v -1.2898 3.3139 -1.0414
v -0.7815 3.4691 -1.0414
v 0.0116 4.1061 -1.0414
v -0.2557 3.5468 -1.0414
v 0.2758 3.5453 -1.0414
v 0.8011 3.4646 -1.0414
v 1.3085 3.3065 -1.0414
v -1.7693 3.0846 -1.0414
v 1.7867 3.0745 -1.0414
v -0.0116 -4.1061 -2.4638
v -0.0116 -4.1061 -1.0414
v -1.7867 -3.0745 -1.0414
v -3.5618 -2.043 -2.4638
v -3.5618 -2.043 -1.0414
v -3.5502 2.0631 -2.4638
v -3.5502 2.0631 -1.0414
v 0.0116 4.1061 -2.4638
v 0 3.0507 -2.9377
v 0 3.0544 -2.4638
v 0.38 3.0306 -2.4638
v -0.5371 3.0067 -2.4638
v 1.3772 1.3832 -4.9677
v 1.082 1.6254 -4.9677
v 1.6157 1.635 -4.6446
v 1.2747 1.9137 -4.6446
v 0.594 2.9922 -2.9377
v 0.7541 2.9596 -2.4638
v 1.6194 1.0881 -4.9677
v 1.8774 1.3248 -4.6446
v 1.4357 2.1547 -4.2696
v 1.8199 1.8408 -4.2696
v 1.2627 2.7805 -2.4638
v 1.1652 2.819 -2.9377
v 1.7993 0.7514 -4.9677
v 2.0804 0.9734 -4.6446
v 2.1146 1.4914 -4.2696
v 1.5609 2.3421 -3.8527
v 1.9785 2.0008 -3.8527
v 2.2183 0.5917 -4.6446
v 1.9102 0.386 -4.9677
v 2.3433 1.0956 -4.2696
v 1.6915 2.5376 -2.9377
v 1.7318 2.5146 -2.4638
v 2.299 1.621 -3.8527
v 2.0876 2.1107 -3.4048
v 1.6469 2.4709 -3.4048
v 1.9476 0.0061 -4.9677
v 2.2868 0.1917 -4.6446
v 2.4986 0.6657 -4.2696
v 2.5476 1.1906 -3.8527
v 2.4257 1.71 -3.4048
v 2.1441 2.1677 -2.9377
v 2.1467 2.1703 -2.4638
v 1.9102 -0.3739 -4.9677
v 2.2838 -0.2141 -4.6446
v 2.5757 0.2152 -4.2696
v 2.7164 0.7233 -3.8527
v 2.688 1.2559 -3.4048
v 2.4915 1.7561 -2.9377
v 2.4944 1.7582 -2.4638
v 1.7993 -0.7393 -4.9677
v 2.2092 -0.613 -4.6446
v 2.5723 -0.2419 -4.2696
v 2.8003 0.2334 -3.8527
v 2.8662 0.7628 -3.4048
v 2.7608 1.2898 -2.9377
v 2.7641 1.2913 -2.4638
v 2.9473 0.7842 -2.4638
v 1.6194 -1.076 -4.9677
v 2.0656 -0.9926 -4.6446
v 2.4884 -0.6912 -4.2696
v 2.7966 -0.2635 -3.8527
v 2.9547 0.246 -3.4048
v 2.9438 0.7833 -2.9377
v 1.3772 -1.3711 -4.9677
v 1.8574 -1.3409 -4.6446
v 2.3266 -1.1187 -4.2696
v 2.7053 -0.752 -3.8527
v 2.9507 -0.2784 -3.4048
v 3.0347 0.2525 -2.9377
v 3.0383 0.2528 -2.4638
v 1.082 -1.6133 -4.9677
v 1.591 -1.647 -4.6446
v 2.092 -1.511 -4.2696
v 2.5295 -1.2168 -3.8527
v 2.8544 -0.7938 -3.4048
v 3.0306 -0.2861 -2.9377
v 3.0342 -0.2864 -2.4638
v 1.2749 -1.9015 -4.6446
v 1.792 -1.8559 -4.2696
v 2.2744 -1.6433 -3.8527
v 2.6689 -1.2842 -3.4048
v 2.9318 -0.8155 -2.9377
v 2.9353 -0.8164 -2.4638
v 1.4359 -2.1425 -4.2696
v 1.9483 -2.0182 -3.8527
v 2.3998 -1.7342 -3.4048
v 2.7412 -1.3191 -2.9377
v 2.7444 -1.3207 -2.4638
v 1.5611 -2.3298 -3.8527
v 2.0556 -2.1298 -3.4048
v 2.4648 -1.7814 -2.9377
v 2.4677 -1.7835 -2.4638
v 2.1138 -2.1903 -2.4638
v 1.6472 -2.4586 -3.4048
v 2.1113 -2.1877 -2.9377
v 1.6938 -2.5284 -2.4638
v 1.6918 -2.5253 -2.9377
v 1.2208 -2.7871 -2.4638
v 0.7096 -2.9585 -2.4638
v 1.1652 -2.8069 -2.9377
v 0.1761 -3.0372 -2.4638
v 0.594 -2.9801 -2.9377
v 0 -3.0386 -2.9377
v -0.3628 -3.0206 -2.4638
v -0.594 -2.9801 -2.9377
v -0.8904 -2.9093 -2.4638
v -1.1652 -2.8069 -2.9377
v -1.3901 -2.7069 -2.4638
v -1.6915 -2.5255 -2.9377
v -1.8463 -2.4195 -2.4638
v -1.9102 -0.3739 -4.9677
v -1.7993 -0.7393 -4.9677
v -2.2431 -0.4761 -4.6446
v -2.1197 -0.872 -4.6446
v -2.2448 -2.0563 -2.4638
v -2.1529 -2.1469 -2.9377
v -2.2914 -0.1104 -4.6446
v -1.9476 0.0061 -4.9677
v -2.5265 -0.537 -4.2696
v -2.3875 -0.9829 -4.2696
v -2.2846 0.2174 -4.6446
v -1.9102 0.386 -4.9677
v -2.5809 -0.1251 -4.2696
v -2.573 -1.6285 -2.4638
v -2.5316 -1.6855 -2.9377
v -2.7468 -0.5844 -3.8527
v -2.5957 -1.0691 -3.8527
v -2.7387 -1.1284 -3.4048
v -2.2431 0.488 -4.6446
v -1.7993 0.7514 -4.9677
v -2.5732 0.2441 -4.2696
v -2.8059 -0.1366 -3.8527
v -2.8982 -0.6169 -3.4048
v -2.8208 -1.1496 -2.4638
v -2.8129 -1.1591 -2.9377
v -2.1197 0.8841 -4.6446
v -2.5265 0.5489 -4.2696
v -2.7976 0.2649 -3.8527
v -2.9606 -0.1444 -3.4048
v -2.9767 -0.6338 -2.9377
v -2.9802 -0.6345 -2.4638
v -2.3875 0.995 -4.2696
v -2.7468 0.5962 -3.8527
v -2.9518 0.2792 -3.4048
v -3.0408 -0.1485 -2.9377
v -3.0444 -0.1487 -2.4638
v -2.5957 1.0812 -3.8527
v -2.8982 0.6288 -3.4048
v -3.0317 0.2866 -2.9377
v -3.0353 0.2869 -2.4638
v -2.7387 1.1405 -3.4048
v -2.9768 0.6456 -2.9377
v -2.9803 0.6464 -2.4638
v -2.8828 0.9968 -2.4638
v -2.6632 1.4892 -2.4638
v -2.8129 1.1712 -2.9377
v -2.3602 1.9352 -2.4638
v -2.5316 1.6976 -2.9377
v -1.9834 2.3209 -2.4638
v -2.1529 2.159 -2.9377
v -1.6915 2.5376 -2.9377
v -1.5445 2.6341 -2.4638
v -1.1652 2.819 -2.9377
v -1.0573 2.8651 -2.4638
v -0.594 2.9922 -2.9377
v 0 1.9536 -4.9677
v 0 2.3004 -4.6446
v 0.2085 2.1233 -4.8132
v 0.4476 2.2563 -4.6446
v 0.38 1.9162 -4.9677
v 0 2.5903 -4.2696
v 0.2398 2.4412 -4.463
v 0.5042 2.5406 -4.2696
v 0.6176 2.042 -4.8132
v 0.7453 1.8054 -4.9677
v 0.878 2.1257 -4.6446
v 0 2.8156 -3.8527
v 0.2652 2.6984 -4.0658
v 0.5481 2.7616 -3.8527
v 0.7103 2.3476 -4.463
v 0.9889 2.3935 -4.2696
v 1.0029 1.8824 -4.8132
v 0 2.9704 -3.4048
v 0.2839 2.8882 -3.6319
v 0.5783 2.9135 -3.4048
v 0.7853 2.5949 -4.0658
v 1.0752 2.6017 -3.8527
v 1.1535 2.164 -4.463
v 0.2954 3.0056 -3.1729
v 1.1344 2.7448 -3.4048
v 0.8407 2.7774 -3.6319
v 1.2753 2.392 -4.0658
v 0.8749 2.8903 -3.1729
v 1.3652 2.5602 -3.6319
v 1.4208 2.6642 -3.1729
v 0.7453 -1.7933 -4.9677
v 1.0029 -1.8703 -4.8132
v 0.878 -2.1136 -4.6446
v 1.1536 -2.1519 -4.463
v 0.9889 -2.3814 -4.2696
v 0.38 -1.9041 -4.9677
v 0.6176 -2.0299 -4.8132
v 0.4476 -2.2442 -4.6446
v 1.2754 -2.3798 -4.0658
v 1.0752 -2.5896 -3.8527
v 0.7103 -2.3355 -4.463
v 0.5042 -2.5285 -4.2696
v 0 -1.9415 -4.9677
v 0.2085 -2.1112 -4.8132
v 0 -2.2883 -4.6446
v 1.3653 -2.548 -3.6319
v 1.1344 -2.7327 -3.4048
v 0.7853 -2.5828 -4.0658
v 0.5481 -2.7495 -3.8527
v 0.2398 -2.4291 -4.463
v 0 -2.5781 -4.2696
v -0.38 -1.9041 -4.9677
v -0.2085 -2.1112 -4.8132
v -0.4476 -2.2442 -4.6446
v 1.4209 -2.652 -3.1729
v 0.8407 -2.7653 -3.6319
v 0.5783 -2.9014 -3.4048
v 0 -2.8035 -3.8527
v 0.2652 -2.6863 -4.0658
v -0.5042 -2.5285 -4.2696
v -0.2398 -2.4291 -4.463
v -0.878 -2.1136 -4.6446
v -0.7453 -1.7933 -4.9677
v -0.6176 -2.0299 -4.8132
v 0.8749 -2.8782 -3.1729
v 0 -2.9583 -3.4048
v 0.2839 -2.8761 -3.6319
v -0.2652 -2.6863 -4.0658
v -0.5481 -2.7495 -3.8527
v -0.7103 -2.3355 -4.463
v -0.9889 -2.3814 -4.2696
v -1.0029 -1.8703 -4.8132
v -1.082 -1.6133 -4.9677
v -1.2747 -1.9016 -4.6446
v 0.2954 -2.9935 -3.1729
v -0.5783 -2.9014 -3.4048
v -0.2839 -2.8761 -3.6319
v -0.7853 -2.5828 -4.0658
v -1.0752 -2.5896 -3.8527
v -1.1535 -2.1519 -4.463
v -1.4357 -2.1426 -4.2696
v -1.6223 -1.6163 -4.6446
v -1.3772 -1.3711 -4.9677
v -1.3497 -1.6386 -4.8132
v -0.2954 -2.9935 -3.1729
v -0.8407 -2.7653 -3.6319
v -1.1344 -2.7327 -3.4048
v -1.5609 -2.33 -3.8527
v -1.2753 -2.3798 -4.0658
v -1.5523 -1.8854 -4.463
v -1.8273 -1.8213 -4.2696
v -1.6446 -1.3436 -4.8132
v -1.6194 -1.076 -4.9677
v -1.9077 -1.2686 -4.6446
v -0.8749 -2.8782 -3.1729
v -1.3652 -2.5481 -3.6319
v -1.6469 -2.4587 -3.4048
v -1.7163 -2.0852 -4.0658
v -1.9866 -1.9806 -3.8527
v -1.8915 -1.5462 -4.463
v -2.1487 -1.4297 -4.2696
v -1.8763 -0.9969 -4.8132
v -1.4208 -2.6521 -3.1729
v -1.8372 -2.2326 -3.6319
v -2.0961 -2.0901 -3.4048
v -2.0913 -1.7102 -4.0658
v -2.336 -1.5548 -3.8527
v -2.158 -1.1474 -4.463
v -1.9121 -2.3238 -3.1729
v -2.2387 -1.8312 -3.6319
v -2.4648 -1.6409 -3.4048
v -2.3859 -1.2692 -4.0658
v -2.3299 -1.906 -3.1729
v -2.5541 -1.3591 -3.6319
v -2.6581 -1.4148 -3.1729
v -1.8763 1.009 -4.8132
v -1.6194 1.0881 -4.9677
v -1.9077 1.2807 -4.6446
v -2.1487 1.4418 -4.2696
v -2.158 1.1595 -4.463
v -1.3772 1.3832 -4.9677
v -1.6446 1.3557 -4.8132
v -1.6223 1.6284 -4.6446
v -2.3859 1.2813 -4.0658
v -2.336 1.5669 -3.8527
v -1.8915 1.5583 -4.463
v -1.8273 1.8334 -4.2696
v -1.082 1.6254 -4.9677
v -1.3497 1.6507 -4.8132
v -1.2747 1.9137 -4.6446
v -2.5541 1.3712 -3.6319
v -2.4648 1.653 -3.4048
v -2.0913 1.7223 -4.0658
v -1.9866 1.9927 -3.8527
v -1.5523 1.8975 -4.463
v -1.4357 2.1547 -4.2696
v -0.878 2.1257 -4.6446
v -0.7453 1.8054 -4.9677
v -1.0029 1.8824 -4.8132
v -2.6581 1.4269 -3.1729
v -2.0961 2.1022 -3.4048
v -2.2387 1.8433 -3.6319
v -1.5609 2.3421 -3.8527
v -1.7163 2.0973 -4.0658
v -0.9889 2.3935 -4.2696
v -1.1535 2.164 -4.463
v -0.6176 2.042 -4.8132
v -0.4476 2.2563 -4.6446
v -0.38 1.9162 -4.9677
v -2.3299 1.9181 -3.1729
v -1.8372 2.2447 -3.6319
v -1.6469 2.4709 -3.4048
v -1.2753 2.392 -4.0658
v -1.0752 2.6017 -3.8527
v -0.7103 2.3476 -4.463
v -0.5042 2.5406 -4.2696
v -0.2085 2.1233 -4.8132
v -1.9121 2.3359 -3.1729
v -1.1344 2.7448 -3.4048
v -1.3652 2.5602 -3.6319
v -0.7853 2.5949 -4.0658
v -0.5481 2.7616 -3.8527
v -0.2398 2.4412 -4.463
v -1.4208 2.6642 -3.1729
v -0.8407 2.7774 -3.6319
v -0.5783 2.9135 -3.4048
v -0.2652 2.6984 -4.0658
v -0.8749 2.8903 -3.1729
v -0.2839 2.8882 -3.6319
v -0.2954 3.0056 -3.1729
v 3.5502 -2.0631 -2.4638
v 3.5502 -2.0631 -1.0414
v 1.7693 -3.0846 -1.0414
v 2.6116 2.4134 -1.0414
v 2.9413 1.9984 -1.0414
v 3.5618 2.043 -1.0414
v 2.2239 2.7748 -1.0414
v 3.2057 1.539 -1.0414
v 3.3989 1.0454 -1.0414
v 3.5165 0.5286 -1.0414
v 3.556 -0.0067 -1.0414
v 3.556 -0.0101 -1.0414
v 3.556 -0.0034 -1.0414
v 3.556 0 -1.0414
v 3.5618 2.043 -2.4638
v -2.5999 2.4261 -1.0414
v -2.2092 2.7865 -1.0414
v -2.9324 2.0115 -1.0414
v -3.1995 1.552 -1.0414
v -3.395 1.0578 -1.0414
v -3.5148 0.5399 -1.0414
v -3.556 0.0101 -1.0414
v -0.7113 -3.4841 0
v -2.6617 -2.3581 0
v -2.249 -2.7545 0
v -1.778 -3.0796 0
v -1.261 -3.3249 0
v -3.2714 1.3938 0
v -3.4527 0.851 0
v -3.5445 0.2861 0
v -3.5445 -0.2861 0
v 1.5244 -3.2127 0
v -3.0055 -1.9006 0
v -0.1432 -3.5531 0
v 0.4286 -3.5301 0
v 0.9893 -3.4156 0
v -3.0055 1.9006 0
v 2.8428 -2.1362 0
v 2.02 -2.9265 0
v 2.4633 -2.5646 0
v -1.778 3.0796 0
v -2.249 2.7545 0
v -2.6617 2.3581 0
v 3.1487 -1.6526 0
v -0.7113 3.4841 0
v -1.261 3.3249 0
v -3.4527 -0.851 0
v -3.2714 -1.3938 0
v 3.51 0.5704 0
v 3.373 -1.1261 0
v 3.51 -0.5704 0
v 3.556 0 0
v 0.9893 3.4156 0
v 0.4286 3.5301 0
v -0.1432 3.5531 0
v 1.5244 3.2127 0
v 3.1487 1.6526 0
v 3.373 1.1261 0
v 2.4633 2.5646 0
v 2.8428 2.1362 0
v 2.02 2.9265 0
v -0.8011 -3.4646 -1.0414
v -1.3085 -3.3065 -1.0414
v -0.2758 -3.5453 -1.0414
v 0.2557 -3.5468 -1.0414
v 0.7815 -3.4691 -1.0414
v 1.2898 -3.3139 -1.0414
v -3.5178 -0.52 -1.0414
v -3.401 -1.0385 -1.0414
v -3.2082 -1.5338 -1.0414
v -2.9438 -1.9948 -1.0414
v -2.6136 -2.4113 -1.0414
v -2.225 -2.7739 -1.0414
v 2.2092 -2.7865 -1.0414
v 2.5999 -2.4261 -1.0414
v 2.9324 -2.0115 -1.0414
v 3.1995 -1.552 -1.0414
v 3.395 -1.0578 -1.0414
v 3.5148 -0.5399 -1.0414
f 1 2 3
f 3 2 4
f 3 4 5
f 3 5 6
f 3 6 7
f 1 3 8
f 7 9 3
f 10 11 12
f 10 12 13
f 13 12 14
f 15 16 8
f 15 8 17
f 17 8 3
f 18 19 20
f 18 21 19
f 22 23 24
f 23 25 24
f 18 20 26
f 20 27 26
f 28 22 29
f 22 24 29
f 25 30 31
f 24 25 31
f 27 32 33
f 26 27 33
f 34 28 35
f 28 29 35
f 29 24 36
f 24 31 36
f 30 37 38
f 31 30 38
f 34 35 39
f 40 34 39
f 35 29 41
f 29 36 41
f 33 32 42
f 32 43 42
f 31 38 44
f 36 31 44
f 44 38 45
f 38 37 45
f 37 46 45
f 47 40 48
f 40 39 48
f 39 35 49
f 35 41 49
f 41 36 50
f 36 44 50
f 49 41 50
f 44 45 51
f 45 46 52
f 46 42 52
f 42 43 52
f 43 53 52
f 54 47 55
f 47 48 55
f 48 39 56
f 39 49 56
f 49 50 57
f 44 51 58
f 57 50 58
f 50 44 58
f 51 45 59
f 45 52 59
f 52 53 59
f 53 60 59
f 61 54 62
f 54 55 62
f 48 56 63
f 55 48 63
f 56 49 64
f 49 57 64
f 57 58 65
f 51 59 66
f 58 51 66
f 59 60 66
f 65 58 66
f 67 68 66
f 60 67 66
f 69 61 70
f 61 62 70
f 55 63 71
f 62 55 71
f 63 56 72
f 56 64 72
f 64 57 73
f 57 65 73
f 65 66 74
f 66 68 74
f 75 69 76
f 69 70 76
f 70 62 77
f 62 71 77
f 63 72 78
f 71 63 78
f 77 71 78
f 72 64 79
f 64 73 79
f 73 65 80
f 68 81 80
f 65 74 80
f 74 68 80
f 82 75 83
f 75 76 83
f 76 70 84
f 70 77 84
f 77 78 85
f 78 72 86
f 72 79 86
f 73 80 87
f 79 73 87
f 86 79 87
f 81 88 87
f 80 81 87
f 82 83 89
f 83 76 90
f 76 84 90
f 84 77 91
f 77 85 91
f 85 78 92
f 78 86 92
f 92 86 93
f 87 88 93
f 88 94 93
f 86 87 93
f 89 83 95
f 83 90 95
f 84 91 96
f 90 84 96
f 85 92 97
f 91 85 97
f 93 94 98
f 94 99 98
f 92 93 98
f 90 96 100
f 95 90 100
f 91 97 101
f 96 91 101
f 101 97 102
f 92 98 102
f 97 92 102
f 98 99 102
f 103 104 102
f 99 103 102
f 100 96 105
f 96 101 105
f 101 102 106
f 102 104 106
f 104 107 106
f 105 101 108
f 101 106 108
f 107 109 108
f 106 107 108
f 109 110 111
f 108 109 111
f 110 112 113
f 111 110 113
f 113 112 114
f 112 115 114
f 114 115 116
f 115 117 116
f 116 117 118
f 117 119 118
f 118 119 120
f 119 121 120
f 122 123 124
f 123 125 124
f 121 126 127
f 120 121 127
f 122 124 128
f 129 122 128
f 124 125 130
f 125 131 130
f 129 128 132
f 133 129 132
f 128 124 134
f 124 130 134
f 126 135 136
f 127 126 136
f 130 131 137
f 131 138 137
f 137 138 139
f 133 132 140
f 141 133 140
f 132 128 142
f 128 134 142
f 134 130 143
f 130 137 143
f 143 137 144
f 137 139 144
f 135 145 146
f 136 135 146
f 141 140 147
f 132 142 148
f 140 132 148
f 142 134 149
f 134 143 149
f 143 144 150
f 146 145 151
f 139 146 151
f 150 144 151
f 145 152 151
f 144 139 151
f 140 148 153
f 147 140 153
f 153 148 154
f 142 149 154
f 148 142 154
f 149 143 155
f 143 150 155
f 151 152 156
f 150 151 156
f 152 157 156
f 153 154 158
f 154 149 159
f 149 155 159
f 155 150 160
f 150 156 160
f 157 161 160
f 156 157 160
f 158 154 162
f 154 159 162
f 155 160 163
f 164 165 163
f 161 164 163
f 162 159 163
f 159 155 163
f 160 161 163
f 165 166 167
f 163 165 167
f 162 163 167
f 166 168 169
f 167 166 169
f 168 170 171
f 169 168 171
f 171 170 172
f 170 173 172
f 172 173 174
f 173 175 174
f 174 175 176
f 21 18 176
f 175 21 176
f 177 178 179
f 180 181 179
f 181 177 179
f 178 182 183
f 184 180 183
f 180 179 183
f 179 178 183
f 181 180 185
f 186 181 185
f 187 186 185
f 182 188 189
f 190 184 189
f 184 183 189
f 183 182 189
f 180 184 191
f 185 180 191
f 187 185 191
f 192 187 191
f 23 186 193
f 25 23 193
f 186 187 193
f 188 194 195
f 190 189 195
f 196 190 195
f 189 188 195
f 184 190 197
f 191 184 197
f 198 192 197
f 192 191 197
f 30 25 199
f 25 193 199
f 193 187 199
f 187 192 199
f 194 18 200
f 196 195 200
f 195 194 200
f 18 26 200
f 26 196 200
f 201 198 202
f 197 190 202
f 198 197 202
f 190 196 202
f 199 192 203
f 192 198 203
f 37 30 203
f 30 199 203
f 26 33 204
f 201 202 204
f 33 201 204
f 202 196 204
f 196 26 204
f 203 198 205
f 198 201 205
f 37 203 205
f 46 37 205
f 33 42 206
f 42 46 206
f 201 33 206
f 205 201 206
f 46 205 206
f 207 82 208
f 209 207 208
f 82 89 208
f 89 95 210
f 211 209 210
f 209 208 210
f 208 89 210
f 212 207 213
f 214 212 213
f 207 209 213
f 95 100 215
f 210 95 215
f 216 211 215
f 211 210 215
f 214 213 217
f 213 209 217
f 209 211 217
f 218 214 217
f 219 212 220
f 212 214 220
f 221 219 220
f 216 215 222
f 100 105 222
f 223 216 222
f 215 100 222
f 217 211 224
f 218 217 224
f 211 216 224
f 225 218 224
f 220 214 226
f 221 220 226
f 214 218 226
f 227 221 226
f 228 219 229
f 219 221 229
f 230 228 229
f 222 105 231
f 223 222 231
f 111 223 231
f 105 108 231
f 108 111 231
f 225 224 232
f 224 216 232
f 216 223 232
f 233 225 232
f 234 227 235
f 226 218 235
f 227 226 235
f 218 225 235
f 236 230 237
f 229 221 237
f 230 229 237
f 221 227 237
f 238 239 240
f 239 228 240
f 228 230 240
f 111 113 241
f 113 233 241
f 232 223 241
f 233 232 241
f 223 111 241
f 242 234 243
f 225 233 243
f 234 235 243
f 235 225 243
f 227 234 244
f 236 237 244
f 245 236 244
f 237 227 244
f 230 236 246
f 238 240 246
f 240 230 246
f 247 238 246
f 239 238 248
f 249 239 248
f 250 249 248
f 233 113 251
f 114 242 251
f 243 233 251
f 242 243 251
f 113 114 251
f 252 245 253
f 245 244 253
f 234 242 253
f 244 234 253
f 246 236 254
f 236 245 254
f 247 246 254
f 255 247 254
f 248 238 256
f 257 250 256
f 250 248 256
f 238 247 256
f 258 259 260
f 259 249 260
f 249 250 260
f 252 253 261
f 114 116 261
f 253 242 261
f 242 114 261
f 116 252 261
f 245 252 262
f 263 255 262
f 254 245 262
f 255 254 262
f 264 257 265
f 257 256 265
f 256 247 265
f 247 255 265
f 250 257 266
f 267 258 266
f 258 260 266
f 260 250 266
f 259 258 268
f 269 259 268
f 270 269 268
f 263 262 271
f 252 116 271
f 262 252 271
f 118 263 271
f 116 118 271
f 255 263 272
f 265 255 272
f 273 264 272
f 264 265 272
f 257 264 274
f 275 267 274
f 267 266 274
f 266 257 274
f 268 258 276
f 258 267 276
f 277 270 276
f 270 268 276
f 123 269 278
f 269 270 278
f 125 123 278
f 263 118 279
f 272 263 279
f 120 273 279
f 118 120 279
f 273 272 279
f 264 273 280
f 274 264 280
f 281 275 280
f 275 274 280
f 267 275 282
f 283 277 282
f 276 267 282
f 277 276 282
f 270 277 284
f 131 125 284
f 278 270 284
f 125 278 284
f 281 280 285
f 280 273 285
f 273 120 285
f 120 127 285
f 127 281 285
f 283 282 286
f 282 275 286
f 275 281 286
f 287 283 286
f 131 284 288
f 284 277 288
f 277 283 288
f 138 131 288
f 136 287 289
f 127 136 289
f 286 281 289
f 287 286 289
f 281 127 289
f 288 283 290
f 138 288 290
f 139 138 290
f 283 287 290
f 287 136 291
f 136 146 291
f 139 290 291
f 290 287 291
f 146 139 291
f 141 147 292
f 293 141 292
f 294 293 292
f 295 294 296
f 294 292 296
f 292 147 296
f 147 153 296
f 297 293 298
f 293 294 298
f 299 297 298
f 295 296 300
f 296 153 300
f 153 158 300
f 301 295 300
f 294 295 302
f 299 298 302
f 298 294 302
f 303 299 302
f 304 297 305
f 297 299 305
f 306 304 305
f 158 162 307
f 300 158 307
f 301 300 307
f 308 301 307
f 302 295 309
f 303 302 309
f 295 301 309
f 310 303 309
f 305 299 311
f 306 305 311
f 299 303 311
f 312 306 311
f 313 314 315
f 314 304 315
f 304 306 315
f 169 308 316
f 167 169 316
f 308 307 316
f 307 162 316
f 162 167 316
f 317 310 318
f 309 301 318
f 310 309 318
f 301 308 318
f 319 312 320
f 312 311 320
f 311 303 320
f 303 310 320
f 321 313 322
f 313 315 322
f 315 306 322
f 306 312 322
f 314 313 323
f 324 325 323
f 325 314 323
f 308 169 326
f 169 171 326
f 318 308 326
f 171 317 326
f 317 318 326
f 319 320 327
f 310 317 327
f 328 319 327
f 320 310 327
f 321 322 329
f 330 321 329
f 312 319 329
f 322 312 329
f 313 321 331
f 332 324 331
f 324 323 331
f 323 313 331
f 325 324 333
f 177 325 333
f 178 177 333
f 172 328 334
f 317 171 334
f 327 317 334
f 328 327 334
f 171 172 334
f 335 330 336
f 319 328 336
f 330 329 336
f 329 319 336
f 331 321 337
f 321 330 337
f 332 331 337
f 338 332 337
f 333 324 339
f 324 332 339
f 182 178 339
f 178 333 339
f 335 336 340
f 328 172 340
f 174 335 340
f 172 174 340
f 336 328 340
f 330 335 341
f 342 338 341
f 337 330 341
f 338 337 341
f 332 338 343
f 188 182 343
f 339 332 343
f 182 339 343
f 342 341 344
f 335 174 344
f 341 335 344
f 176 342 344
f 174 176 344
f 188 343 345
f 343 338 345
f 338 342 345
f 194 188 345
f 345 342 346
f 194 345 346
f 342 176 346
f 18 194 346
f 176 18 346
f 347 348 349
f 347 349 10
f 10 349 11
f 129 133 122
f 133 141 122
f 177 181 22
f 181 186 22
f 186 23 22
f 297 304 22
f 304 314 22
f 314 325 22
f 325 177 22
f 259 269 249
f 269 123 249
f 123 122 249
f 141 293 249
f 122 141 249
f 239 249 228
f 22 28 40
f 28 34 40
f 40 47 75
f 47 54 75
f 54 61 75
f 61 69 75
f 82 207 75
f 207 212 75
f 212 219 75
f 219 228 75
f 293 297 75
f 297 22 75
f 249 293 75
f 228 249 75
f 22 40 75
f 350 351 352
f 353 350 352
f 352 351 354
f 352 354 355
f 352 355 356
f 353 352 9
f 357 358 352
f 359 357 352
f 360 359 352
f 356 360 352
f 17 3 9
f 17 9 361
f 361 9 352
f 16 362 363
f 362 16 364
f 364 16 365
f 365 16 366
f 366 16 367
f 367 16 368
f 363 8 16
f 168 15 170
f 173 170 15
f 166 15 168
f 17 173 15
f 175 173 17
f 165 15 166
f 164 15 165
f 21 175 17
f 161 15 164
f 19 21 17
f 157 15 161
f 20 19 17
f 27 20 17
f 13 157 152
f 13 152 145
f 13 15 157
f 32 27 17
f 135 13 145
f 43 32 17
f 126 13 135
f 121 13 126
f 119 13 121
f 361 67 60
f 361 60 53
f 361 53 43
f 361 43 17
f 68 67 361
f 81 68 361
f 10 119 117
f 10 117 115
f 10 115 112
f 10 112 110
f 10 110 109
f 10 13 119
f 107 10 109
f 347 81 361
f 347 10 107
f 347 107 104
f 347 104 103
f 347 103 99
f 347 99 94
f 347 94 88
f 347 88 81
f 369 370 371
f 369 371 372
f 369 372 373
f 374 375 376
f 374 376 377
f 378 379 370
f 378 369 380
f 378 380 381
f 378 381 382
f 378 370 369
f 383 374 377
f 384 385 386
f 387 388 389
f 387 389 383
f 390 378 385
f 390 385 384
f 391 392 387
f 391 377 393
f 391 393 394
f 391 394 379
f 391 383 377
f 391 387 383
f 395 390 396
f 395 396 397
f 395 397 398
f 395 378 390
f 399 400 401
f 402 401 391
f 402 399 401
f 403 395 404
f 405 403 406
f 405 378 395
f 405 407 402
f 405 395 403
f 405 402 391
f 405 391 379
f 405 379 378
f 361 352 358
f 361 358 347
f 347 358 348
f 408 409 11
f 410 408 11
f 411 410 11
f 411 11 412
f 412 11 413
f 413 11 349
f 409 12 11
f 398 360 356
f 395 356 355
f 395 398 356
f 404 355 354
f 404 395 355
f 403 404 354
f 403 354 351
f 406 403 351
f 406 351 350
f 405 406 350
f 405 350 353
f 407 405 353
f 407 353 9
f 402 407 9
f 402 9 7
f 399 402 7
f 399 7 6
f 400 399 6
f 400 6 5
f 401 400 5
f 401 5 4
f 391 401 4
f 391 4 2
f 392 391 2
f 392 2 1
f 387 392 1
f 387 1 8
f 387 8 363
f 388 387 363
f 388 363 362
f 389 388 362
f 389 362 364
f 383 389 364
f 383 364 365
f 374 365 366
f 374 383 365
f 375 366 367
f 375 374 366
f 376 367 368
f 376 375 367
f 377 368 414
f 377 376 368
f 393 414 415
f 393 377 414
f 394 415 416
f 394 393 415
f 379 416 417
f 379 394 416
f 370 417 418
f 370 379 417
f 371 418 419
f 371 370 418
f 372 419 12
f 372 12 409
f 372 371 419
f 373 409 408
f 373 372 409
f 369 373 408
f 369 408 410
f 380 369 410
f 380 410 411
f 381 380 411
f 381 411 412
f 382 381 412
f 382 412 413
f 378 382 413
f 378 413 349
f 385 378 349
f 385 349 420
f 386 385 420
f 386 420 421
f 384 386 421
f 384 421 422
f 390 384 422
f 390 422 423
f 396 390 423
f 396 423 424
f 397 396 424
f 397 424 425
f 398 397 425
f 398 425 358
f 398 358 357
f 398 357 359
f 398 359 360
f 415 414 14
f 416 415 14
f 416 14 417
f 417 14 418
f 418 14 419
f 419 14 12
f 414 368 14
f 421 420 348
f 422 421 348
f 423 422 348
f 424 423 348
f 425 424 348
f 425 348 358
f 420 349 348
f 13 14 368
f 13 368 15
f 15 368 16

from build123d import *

# Parameters (mm, degrees)
F0_R     = 3.556
F1_DEPTH = 1.0414
F3_DEPTH = 1.4224


with BuildPart() as f1:
    # F0 (on Top) → F1 (new body)
    with BuildSketch(Plane.XY):
        Circle(F0_R)
    extrude(amount=-F1_DEPTH)

    # F2 (on face) → F3 (join)
    with BuildSketch(Plane(origin=(0, 0, -1.0414), x_dir=(1, 0, 0), z_dir=(0, 0, -1))):
        Polygon((0.011627, -4.106099), (3.561799, -2.04298), (3.550172, 2.063119), (-0.011627, 4.106099), (-3.561799, 2.04298), (-3.550172, -2.063119), align=None)
    extrude(amount=F3_DEPTH)

    # F4 (on Right) → F5 (revolve)
    with BuildSketch(Plane.YZ):
        with BuildLine():
            Line((0.006052, -2.459678), (0.006052, -4.96768))
            Line((0.006052, -4.96768), (1.953649, -4.96768))
            ThreePointArc((1.953649, -4.96768), (2.816414, -3.850818), (3.054052, -2.459678))
            Line((3.054052, -2.459678), (0.006052, -2.459678))
        make_face()
    revolve(axis=Axis((0, 0.006052, -3.713679), (0, 0, -1)))


solid = f1.part
